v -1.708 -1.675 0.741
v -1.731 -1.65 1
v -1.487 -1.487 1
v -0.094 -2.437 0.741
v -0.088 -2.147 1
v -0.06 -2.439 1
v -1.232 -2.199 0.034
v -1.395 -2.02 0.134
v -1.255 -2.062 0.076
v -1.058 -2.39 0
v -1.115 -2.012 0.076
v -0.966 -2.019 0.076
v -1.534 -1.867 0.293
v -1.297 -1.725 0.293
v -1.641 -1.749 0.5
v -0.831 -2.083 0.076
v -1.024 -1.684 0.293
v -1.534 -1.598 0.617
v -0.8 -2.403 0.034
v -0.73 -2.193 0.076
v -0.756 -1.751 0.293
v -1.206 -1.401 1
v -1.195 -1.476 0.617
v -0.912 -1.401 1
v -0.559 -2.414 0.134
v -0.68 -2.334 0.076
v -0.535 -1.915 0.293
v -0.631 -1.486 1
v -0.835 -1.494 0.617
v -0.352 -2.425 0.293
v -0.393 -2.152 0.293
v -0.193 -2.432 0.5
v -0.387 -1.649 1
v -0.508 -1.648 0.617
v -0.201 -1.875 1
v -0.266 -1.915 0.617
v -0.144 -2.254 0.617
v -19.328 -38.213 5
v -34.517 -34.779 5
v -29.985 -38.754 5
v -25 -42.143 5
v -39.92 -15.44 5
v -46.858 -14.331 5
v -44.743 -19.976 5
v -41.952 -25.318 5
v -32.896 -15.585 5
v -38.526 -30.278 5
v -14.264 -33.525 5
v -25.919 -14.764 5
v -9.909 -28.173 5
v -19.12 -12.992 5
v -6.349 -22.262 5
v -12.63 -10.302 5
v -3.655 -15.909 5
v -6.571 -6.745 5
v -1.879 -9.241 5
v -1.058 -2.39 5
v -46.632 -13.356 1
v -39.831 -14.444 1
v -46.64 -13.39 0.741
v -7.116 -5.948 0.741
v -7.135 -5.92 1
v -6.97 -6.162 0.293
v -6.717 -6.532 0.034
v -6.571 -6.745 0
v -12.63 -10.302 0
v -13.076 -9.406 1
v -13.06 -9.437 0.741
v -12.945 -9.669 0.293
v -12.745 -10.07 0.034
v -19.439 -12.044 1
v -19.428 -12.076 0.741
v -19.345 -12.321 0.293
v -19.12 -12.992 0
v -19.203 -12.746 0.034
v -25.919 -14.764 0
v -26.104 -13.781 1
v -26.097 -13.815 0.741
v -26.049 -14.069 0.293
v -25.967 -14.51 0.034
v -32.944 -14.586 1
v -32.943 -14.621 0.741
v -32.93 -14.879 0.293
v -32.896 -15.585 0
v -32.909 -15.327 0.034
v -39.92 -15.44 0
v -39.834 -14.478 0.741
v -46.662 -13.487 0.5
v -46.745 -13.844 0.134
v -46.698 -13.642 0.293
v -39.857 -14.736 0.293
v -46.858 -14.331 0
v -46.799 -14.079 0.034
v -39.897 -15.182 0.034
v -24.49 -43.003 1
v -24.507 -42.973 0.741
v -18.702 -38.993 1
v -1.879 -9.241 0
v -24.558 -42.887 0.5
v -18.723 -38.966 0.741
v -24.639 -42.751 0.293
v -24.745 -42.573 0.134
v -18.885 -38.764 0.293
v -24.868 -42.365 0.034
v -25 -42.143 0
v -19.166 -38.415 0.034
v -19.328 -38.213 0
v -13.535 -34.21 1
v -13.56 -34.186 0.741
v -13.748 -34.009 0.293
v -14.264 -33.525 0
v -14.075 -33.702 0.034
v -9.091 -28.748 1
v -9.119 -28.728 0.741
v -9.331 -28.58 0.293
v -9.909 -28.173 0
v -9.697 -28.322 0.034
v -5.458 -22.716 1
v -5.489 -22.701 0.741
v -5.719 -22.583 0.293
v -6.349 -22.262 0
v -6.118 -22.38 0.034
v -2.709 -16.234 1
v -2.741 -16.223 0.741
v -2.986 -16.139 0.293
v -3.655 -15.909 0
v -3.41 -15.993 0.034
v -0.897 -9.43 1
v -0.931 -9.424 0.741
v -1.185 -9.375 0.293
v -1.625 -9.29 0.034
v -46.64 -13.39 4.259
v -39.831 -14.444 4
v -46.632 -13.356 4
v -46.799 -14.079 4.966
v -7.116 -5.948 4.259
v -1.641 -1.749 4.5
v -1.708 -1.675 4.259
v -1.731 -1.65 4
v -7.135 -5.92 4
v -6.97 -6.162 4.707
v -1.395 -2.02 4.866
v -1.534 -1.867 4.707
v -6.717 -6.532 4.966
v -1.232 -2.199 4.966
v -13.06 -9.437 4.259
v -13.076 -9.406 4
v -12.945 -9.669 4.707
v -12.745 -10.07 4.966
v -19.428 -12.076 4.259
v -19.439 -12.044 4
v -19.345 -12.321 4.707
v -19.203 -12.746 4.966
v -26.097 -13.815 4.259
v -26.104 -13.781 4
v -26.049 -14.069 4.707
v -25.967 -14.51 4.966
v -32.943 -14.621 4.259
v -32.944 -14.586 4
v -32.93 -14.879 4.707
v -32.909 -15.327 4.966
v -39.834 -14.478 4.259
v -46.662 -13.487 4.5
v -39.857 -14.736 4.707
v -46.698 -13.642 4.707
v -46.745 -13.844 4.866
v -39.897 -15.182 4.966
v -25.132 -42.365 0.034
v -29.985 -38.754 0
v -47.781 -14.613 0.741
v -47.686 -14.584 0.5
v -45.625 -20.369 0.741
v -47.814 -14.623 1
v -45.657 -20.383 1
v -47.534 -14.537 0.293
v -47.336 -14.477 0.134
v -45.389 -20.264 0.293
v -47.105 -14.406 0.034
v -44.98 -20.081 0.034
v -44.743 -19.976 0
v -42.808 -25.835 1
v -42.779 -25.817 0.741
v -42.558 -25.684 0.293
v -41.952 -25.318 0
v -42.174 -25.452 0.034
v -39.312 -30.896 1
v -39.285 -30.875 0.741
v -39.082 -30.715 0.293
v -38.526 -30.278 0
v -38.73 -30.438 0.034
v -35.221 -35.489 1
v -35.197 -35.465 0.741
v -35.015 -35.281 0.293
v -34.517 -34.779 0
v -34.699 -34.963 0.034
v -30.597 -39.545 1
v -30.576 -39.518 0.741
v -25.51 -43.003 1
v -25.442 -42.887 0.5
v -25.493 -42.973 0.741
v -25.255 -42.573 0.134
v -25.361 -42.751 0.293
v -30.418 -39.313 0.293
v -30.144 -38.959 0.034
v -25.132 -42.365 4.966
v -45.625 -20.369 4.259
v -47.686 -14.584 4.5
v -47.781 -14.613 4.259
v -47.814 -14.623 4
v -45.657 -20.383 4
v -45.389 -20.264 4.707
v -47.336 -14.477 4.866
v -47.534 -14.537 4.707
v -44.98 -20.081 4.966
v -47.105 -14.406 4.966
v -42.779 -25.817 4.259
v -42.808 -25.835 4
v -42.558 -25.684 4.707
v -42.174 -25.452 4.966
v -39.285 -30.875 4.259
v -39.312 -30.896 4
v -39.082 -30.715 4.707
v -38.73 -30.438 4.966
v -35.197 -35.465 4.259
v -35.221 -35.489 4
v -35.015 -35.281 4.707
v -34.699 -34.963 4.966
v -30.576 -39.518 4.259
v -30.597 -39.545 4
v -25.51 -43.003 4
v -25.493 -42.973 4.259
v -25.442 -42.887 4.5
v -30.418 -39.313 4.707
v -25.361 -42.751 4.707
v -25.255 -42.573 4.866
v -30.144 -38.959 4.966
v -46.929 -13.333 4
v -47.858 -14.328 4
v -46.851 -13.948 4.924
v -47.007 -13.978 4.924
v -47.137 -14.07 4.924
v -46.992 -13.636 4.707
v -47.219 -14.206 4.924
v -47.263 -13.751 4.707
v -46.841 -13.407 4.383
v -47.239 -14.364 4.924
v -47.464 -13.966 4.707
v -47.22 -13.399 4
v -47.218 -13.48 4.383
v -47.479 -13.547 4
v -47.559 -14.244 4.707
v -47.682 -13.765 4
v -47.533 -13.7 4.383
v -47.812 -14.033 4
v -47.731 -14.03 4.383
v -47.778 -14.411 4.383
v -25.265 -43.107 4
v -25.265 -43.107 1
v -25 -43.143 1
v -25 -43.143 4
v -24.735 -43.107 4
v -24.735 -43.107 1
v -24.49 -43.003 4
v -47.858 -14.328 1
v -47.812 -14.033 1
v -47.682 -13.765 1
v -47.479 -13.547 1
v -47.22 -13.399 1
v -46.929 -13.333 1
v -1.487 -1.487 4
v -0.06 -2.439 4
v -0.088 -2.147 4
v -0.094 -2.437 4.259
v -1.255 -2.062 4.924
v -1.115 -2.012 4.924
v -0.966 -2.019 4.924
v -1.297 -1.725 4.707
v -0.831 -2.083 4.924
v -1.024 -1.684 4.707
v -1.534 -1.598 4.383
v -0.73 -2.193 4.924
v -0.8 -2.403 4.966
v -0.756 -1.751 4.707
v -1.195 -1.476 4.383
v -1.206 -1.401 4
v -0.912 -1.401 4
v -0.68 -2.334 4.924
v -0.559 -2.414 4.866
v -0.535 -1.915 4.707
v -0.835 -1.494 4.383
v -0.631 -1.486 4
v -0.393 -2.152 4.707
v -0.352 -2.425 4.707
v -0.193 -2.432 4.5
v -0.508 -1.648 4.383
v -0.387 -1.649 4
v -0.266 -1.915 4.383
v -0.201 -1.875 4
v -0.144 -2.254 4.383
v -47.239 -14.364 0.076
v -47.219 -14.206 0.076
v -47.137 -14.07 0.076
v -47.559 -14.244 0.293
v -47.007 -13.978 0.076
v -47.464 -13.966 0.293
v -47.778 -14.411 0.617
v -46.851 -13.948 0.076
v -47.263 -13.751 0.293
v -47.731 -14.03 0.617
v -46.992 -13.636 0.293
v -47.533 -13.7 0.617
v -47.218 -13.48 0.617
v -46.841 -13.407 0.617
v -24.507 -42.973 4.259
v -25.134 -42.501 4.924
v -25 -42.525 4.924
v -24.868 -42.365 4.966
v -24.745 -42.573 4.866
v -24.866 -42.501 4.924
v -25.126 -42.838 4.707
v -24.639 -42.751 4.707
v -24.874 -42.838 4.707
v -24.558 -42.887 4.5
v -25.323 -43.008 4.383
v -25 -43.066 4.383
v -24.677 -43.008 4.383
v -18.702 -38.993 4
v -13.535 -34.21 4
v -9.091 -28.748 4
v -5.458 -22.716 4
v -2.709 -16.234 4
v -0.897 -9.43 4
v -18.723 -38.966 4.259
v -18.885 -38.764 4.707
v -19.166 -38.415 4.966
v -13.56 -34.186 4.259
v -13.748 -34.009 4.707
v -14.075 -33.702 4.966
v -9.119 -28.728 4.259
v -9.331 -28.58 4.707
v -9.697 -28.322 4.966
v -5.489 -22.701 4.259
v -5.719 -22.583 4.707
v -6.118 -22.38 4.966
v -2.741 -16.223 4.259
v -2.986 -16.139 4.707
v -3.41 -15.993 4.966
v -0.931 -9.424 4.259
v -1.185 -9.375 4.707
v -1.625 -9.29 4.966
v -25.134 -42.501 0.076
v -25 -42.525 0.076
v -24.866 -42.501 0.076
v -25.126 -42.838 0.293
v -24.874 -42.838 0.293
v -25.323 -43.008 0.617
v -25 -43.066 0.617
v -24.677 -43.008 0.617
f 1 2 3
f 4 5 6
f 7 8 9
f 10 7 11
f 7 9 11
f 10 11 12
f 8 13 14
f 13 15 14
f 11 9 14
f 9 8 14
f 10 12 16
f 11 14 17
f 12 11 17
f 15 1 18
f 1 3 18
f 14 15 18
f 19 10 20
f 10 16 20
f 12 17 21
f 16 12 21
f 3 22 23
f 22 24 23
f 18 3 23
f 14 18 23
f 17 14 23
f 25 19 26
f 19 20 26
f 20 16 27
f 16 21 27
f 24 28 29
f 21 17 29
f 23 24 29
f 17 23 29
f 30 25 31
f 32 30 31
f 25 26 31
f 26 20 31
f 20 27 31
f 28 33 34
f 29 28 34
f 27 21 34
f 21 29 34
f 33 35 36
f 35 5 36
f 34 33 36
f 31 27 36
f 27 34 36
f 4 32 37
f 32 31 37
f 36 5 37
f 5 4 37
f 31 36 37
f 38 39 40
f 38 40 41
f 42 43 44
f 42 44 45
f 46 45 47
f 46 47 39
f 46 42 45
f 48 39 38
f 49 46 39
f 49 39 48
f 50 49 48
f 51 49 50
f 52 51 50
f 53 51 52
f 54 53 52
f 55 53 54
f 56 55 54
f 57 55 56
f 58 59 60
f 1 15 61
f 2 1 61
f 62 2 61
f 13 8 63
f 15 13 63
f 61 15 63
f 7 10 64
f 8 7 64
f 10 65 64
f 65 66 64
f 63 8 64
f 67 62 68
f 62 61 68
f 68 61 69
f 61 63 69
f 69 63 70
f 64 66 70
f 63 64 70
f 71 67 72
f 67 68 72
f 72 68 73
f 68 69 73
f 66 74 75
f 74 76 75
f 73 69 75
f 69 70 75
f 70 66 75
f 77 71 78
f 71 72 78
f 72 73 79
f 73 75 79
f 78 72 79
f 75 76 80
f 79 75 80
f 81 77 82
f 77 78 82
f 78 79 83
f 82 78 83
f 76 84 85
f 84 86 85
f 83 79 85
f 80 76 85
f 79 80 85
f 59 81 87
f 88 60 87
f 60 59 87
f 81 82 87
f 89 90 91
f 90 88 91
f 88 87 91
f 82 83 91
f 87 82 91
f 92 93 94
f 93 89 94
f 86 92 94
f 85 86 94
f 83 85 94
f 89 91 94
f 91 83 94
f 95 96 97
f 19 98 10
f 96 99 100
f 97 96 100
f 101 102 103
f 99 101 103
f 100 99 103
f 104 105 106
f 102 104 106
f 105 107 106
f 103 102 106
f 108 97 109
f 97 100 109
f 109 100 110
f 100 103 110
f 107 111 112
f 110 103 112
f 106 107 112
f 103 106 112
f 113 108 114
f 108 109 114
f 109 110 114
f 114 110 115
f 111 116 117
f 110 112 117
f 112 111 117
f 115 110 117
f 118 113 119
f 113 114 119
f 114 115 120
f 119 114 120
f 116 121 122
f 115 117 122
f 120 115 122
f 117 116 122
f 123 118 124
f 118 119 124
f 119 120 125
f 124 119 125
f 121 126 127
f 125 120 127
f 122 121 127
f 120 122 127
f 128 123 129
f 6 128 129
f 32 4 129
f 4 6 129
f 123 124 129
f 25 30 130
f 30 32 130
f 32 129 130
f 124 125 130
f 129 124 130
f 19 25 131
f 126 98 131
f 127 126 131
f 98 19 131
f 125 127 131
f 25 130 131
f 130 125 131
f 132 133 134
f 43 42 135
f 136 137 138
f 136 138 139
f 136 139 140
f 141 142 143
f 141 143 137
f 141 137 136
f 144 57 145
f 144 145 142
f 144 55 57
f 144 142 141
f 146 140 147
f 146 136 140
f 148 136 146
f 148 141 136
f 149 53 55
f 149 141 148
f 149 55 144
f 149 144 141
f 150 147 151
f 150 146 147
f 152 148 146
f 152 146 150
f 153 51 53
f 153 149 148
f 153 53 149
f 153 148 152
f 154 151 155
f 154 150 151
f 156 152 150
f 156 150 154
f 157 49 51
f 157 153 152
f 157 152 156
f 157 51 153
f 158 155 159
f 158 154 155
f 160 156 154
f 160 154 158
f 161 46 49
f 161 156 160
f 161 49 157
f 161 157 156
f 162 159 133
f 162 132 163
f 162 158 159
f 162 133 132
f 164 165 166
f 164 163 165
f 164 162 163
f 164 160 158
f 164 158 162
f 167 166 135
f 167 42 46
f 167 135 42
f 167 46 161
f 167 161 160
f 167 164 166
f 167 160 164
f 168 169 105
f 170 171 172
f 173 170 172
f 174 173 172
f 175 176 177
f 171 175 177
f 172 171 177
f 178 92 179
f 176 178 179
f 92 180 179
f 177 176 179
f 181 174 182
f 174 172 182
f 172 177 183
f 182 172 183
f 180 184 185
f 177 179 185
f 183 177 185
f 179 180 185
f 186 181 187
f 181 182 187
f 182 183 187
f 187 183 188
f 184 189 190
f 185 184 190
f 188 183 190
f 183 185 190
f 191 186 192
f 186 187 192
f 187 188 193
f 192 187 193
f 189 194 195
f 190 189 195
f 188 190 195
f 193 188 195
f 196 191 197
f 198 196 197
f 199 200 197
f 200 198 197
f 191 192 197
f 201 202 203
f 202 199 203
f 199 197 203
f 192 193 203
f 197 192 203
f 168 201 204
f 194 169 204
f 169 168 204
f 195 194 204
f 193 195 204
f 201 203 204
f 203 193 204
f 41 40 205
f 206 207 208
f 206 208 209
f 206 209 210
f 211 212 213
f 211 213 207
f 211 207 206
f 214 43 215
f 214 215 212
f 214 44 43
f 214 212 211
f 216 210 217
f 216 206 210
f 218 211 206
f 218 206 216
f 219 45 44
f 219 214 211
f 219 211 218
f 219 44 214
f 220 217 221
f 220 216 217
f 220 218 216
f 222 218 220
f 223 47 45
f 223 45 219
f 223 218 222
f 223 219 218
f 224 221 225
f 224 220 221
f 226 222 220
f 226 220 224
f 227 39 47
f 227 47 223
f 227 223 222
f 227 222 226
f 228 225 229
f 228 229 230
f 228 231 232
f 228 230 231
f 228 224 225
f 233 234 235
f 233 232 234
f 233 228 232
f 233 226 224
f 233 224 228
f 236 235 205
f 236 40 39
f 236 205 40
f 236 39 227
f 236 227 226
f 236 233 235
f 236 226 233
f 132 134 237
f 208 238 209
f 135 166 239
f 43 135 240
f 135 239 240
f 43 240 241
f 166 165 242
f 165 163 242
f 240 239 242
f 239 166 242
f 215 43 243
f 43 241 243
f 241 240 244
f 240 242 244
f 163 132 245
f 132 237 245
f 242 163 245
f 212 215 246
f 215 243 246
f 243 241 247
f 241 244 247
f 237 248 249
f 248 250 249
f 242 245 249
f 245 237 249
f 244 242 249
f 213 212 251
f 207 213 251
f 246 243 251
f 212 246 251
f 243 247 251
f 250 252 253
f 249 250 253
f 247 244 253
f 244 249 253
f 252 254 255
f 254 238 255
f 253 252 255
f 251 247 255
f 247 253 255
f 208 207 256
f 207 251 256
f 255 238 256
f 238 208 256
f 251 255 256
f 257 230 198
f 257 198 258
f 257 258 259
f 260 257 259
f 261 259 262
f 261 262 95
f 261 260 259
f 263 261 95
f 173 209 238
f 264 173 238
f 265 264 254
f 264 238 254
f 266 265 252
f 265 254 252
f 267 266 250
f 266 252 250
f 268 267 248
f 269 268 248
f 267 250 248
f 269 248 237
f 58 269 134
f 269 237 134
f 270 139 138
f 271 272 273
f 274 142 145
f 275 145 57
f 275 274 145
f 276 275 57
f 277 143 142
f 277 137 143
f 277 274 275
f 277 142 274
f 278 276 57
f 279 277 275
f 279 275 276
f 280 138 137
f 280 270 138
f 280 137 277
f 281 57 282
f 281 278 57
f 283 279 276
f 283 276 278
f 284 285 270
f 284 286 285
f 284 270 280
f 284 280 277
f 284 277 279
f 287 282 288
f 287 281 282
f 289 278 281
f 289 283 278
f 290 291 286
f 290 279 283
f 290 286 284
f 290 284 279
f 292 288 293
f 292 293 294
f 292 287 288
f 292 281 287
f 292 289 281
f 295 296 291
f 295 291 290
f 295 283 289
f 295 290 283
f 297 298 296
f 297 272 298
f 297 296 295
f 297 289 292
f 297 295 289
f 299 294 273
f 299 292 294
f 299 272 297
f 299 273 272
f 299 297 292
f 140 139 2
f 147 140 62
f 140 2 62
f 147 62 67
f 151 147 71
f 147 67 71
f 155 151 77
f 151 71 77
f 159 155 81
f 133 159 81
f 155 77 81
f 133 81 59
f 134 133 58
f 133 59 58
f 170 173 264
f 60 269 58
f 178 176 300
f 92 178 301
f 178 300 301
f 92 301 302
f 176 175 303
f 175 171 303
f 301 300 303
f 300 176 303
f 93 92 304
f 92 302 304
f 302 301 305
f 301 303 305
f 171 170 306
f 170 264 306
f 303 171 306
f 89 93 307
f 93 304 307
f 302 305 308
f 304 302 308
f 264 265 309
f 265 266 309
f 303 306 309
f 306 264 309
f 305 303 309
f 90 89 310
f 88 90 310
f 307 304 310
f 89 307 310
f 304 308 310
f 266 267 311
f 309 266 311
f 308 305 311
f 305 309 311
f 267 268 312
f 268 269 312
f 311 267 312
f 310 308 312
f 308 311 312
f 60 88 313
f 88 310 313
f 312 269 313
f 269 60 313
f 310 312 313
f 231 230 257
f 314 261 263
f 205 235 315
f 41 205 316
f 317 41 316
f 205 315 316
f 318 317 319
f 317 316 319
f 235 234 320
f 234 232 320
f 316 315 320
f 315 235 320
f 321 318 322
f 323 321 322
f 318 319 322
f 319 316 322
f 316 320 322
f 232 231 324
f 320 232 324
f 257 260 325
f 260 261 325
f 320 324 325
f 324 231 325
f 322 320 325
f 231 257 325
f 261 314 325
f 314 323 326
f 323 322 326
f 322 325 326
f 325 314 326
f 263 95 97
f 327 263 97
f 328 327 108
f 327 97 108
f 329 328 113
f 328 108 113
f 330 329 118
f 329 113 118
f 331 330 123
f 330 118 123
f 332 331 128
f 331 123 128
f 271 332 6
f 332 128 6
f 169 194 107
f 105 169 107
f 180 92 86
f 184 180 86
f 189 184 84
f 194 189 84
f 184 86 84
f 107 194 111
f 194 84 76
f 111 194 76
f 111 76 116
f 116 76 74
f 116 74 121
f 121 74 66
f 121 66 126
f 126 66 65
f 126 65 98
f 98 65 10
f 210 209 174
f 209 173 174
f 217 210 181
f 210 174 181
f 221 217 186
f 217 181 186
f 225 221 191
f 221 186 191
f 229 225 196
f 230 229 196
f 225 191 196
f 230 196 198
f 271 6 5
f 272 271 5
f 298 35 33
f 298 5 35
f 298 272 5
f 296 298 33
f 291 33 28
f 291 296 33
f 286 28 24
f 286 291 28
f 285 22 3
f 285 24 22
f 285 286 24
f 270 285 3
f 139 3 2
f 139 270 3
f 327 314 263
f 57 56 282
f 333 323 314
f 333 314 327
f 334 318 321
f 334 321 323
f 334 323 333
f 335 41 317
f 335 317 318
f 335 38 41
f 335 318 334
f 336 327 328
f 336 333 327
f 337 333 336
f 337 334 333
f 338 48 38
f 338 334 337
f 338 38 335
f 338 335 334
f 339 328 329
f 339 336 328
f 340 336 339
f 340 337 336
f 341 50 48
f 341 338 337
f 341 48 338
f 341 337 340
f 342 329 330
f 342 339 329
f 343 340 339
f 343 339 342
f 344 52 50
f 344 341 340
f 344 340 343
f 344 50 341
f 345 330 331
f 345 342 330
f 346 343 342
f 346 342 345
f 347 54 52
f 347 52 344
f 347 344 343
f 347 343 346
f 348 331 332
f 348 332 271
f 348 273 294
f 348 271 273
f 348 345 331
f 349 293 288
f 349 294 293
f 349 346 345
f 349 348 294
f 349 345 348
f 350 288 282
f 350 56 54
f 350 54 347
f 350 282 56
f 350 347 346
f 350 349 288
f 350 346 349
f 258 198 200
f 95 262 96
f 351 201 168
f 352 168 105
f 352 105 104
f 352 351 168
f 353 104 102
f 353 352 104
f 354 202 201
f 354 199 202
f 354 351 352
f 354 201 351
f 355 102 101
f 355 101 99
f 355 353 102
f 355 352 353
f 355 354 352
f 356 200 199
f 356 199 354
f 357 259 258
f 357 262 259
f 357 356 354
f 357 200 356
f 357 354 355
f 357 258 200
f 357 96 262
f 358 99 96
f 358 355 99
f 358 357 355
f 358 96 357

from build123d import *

# Parameters (mm, degrees)
ESTRUSIONE_ESTRUSIONE1_DEPTH = 5
RACCORDO1_R                  = 1


with BuildPart() as part:
    # Schizzo1 → Estrusione-Estrusione1 (new body)
    with BuildSketch(Plane.XY):
        with BuildLine():
            ThreePointArc((-48.296291314, -12.940952255), (-39.667667015, -30.43807145), (-25, -43.301270189))
            ThreePointArc((-25, -43.301270189), (-6.698729811, -25), (0, 0))
            ThreePointArc((0, 0), (-22.414386804, -12.940952255), (-48.296291314, -12.940952255))
        make_face()
    extrude(amount=ESTRUSIONE_ESTRUSIONE1_DEPTH)

    # Raccordo1
    raccordo1_edges = [part.edges().sort_by_distance(p)[0] for p in [
        (-39.667667015, -30.43807145, 5),
        (-39.667667015, -30.43807145, 0),
        (-22.414386804, -12.940952255, 0),
        (-6.698729811, -25, 0),
        (-6.698729811, -25, 5),
        (-25, -43.301270189, 2.5),
        (-48.296291314, -12.940952255, 2.5),
        (0, 0, 2.5),
        (-22.414386804, -12.940952255, 5),
    ]]
    fillet(raccordo1_edges, radius=RACCORDO1_R)


solid = part.part
